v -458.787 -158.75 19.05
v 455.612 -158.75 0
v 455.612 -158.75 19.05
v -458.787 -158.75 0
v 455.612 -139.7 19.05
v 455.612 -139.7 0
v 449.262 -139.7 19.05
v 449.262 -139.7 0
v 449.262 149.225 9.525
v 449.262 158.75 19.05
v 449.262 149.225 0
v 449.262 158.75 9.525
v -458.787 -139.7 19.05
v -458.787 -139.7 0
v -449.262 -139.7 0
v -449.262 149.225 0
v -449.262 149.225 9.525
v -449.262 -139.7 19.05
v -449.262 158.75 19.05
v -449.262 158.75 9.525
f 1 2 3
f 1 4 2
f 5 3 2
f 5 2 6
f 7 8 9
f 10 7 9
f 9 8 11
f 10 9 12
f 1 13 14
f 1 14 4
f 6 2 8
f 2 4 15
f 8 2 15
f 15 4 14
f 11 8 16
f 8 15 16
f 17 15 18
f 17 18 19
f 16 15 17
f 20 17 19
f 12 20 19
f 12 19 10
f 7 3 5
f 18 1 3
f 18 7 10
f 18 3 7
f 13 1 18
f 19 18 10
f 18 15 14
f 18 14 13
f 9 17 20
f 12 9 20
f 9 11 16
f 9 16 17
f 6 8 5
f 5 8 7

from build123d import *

# Parameters (mm, degrees)
F0_W     = 898.525
F0_H     = 317.5
F1_DEPTH = 19.05
F2_W     = 9.525
F2_H     = 9.525
F3_DEPTH = 898.526
F4_W     = 19.05
F4_H     = 19.05
F5_DEPTH = 9.525
F6_W     = 19.05
F6_H     = 19.05
F7_DEPTH = 6.35


with BuildPart() as f1:
    # F0 (on Top) → F1 (new body)
    with BuildSketch(Plane.XY):
        Rectangle(F0_W, F0_H)
    extrude(amount=F1_DEPTH)

    # F2 (on face) → F3 (cut, through all)
    with BuildSketch(Plane.YZ.offset(449.2625)):
        with Locations((153.9875, 4.7625)):
            Rectangle(F2_W, F2_H)
    extrude(amount=-F3_DEPTH, mode=Mode.SUBTRACT)

    # F4 (on face) → F5 (join)
    with BuildSketch(Plane(origin=(-449.2625, 0, 0), x_dir=(0, -1, 0), z_dir=(-1, 0, 0))):
        with Locations((149.225, 9.525)):
            Rectangle(F4_W, F4_H)
    extrude(amount=F5_DEPTH)

    # F6 (on face) → F7 (join)
    with BuildSketch(Plane.YZ.offset(449.2625)):
        with Locations((-149.225, 9.525)):
            Rectangle(F6_W, F6_H)
    extrude(amount=F7_DEPTH)


solid = f1.part
